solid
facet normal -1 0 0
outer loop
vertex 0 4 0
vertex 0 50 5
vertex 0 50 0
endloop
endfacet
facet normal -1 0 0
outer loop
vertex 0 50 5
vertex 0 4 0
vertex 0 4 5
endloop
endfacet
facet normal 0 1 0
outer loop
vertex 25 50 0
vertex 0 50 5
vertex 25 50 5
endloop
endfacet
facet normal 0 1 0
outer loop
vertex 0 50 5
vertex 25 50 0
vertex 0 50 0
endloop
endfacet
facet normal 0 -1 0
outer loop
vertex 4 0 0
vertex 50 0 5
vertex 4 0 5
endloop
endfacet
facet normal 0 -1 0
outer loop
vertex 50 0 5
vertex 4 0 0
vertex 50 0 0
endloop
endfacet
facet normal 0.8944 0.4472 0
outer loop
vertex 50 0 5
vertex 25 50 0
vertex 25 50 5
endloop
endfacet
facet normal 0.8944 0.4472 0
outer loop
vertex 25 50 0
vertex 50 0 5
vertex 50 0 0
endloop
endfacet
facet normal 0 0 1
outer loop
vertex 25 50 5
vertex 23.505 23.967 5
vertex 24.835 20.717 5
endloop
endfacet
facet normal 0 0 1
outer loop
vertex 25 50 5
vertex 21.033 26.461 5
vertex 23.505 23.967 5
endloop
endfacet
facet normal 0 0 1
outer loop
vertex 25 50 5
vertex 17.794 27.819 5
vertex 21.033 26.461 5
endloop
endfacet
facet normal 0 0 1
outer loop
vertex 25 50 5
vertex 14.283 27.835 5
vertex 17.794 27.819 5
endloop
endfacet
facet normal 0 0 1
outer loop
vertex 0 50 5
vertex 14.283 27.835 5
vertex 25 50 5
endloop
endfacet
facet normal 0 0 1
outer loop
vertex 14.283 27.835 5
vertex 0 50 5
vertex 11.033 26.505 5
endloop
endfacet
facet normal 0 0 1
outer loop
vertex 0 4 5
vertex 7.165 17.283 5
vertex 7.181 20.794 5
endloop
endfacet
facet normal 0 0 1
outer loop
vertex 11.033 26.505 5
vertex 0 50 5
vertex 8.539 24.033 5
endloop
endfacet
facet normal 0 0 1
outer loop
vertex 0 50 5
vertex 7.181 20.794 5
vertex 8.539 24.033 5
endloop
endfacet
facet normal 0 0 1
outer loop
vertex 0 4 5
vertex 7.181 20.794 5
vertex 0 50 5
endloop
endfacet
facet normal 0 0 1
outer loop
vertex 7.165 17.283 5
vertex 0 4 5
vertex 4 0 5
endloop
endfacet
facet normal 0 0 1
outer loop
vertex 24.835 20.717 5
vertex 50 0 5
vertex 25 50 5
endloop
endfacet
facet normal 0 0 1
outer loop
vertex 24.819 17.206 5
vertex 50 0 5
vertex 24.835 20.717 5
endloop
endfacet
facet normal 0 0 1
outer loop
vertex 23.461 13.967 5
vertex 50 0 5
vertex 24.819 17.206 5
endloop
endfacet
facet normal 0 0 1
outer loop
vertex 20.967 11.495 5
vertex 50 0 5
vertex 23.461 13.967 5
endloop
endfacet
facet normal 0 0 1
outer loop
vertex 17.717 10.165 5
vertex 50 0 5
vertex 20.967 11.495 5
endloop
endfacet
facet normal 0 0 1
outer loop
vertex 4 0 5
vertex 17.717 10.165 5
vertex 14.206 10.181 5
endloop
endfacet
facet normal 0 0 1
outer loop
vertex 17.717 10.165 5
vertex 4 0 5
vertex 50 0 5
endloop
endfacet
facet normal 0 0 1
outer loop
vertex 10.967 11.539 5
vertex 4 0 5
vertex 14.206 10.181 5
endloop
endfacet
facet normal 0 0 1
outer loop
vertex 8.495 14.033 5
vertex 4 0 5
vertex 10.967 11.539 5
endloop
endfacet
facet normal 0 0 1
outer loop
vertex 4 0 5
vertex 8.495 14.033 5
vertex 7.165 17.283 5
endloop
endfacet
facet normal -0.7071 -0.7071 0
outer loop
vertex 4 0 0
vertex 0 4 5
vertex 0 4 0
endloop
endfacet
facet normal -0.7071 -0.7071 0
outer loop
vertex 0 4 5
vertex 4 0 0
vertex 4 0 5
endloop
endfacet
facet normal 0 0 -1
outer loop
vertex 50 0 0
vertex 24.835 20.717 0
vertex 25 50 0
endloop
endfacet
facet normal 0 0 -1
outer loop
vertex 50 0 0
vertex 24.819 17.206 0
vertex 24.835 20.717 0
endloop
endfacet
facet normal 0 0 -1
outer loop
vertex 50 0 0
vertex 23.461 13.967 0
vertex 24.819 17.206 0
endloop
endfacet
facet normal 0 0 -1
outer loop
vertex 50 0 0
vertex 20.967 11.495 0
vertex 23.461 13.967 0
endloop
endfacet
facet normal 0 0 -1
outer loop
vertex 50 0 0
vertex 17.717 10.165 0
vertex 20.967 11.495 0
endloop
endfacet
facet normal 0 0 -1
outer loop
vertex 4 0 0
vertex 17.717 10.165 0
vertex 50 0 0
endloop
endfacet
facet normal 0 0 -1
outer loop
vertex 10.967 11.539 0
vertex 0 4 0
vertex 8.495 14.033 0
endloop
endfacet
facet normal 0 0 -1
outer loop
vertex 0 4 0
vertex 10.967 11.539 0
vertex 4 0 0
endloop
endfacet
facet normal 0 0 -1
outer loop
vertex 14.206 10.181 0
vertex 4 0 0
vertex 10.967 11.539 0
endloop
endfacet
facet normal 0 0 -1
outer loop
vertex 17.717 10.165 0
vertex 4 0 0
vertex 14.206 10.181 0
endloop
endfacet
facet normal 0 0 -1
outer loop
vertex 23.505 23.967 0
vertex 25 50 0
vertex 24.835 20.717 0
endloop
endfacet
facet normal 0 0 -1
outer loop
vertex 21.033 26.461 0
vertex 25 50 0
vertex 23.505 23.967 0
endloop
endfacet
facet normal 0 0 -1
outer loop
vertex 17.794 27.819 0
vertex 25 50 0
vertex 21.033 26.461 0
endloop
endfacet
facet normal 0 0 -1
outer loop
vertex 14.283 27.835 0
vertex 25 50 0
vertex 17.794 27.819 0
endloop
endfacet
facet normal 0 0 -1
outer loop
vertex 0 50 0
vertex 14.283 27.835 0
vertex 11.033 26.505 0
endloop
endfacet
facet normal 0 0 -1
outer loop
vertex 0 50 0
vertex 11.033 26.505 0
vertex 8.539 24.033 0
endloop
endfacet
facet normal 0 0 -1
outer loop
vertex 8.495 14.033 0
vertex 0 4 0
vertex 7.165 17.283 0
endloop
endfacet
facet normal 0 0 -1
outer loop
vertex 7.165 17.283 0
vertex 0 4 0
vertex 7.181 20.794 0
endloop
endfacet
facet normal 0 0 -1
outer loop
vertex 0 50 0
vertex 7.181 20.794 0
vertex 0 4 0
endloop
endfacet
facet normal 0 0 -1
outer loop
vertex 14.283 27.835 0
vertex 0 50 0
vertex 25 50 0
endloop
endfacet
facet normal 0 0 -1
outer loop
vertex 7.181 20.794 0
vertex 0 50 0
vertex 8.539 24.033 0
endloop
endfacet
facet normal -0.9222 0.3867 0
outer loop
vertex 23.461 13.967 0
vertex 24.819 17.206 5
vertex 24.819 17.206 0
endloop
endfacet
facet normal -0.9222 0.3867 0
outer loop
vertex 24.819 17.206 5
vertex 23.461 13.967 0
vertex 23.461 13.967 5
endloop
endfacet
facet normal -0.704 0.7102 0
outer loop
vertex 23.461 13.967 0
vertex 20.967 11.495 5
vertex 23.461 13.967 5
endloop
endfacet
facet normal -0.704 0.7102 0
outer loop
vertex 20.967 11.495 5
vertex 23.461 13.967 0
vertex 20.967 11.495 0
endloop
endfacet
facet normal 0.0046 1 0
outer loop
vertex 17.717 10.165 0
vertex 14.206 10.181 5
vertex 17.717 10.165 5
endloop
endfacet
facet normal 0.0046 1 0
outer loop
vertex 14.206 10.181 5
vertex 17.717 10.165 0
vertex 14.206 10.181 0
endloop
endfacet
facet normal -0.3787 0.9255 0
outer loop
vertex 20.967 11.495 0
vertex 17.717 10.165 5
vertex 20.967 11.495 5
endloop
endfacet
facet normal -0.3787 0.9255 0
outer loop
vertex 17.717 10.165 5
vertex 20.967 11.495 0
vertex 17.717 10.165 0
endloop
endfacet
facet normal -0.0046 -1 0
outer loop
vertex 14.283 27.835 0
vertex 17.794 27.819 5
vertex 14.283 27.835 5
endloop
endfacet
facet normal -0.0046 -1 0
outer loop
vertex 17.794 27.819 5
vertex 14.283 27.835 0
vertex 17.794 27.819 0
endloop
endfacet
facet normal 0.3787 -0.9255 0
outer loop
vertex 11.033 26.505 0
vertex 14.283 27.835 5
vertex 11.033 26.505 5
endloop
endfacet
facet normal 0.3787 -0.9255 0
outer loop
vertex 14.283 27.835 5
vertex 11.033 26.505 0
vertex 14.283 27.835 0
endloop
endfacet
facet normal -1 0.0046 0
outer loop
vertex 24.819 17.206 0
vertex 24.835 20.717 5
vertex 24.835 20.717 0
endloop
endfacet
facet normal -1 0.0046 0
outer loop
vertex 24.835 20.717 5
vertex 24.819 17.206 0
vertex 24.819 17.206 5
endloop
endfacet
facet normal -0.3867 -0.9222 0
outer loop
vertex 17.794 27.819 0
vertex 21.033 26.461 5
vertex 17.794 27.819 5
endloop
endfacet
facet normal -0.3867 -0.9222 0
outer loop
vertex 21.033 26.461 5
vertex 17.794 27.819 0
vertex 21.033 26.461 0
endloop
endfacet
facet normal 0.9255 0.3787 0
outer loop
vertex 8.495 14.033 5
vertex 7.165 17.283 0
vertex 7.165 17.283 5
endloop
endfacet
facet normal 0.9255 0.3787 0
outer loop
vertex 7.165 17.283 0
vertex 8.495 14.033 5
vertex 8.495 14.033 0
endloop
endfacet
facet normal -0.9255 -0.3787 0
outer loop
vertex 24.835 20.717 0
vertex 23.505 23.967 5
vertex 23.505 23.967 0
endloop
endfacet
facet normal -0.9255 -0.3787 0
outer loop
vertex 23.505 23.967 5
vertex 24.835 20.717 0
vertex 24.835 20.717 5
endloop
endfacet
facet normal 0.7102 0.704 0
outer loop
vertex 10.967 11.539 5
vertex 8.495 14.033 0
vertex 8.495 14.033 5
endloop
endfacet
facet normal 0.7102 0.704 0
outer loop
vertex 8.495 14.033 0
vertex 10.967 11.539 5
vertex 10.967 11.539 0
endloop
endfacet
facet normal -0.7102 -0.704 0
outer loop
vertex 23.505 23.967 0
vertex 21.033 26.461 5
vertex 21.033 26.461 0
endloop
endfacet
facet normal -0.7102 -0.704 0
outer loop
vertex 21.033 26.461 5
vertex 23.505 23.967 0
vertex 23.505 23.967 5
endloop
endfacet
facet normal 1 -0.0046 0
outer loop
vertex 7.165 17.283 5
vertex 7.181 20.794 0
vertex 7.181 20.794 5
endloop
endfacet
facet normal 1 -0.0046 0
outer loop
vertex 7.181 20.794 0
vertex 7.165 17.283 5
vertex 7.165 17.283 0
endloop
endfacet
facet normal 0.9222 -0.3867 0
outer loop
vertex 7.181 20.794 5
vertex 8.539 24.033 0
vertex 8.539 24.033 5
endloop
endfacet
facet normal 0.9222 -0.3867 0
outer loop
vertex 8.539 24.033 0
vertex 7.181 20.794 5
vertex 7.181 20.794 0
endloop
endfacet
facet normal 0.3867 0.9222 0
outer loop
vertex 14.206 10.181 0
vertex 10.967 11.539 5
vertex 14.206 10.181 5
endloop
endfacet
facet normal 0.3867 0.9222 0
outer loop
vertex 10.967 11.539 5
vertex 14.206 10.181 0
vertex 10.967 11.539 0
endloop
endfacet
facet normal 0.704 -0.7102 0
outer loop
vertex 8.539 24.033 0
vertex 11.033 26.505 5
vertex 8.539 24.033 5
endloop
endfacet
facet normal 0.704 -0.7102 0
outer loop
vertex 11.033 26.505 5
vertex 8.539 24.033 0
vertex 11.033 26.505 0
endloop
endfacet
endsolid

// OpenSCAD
$fn = 32;

// ----------------------------------------------------------------------
// Bracket plate: gusset 50 x 50
// ----------------------------------------------------------------------

// --- parameters (mm) ---
hole_r = 4;               // bolt hole radius
plate_t = 5;              // plate thickness, Z (extrusion height)
gus_a = 50;               // base length
gus_b = 50;               // height
top_x = 25;               // top edge X of the angled cut
light_r = 9;              // lightening hole radius

light_d = 2 * light_r;

profile = [[4, 0], [25, 0], [50, 0], [25, 50], [0, 50], [0, 4]];  // primary outline, 6 points, counter clockwise
void_1 = [[24.835, 20.717], [23.505, 23.967], [21.033, 26.461], [17.794, 27.819], [14.283, 27.835], [11.033, 26.505], [8.539, 24.033], [7.181, 20.794], [7.165, 17.283], [8.495, 14.033], [10.967, 11.539], [14.206, 10.181], [17.717, 10.165], [20.967, 11.495], [23.461, 13.967], [24.819, 17.206]];  // lightening hole, 16 points

// --- the one profile operation ---
difference() {
  linear_extrude(height = plate_t) polygon(points = profile);
  translate([0, 0, -1])
    linear_extrude(height = plate_t + 2) polygon(points = void_1);
}
